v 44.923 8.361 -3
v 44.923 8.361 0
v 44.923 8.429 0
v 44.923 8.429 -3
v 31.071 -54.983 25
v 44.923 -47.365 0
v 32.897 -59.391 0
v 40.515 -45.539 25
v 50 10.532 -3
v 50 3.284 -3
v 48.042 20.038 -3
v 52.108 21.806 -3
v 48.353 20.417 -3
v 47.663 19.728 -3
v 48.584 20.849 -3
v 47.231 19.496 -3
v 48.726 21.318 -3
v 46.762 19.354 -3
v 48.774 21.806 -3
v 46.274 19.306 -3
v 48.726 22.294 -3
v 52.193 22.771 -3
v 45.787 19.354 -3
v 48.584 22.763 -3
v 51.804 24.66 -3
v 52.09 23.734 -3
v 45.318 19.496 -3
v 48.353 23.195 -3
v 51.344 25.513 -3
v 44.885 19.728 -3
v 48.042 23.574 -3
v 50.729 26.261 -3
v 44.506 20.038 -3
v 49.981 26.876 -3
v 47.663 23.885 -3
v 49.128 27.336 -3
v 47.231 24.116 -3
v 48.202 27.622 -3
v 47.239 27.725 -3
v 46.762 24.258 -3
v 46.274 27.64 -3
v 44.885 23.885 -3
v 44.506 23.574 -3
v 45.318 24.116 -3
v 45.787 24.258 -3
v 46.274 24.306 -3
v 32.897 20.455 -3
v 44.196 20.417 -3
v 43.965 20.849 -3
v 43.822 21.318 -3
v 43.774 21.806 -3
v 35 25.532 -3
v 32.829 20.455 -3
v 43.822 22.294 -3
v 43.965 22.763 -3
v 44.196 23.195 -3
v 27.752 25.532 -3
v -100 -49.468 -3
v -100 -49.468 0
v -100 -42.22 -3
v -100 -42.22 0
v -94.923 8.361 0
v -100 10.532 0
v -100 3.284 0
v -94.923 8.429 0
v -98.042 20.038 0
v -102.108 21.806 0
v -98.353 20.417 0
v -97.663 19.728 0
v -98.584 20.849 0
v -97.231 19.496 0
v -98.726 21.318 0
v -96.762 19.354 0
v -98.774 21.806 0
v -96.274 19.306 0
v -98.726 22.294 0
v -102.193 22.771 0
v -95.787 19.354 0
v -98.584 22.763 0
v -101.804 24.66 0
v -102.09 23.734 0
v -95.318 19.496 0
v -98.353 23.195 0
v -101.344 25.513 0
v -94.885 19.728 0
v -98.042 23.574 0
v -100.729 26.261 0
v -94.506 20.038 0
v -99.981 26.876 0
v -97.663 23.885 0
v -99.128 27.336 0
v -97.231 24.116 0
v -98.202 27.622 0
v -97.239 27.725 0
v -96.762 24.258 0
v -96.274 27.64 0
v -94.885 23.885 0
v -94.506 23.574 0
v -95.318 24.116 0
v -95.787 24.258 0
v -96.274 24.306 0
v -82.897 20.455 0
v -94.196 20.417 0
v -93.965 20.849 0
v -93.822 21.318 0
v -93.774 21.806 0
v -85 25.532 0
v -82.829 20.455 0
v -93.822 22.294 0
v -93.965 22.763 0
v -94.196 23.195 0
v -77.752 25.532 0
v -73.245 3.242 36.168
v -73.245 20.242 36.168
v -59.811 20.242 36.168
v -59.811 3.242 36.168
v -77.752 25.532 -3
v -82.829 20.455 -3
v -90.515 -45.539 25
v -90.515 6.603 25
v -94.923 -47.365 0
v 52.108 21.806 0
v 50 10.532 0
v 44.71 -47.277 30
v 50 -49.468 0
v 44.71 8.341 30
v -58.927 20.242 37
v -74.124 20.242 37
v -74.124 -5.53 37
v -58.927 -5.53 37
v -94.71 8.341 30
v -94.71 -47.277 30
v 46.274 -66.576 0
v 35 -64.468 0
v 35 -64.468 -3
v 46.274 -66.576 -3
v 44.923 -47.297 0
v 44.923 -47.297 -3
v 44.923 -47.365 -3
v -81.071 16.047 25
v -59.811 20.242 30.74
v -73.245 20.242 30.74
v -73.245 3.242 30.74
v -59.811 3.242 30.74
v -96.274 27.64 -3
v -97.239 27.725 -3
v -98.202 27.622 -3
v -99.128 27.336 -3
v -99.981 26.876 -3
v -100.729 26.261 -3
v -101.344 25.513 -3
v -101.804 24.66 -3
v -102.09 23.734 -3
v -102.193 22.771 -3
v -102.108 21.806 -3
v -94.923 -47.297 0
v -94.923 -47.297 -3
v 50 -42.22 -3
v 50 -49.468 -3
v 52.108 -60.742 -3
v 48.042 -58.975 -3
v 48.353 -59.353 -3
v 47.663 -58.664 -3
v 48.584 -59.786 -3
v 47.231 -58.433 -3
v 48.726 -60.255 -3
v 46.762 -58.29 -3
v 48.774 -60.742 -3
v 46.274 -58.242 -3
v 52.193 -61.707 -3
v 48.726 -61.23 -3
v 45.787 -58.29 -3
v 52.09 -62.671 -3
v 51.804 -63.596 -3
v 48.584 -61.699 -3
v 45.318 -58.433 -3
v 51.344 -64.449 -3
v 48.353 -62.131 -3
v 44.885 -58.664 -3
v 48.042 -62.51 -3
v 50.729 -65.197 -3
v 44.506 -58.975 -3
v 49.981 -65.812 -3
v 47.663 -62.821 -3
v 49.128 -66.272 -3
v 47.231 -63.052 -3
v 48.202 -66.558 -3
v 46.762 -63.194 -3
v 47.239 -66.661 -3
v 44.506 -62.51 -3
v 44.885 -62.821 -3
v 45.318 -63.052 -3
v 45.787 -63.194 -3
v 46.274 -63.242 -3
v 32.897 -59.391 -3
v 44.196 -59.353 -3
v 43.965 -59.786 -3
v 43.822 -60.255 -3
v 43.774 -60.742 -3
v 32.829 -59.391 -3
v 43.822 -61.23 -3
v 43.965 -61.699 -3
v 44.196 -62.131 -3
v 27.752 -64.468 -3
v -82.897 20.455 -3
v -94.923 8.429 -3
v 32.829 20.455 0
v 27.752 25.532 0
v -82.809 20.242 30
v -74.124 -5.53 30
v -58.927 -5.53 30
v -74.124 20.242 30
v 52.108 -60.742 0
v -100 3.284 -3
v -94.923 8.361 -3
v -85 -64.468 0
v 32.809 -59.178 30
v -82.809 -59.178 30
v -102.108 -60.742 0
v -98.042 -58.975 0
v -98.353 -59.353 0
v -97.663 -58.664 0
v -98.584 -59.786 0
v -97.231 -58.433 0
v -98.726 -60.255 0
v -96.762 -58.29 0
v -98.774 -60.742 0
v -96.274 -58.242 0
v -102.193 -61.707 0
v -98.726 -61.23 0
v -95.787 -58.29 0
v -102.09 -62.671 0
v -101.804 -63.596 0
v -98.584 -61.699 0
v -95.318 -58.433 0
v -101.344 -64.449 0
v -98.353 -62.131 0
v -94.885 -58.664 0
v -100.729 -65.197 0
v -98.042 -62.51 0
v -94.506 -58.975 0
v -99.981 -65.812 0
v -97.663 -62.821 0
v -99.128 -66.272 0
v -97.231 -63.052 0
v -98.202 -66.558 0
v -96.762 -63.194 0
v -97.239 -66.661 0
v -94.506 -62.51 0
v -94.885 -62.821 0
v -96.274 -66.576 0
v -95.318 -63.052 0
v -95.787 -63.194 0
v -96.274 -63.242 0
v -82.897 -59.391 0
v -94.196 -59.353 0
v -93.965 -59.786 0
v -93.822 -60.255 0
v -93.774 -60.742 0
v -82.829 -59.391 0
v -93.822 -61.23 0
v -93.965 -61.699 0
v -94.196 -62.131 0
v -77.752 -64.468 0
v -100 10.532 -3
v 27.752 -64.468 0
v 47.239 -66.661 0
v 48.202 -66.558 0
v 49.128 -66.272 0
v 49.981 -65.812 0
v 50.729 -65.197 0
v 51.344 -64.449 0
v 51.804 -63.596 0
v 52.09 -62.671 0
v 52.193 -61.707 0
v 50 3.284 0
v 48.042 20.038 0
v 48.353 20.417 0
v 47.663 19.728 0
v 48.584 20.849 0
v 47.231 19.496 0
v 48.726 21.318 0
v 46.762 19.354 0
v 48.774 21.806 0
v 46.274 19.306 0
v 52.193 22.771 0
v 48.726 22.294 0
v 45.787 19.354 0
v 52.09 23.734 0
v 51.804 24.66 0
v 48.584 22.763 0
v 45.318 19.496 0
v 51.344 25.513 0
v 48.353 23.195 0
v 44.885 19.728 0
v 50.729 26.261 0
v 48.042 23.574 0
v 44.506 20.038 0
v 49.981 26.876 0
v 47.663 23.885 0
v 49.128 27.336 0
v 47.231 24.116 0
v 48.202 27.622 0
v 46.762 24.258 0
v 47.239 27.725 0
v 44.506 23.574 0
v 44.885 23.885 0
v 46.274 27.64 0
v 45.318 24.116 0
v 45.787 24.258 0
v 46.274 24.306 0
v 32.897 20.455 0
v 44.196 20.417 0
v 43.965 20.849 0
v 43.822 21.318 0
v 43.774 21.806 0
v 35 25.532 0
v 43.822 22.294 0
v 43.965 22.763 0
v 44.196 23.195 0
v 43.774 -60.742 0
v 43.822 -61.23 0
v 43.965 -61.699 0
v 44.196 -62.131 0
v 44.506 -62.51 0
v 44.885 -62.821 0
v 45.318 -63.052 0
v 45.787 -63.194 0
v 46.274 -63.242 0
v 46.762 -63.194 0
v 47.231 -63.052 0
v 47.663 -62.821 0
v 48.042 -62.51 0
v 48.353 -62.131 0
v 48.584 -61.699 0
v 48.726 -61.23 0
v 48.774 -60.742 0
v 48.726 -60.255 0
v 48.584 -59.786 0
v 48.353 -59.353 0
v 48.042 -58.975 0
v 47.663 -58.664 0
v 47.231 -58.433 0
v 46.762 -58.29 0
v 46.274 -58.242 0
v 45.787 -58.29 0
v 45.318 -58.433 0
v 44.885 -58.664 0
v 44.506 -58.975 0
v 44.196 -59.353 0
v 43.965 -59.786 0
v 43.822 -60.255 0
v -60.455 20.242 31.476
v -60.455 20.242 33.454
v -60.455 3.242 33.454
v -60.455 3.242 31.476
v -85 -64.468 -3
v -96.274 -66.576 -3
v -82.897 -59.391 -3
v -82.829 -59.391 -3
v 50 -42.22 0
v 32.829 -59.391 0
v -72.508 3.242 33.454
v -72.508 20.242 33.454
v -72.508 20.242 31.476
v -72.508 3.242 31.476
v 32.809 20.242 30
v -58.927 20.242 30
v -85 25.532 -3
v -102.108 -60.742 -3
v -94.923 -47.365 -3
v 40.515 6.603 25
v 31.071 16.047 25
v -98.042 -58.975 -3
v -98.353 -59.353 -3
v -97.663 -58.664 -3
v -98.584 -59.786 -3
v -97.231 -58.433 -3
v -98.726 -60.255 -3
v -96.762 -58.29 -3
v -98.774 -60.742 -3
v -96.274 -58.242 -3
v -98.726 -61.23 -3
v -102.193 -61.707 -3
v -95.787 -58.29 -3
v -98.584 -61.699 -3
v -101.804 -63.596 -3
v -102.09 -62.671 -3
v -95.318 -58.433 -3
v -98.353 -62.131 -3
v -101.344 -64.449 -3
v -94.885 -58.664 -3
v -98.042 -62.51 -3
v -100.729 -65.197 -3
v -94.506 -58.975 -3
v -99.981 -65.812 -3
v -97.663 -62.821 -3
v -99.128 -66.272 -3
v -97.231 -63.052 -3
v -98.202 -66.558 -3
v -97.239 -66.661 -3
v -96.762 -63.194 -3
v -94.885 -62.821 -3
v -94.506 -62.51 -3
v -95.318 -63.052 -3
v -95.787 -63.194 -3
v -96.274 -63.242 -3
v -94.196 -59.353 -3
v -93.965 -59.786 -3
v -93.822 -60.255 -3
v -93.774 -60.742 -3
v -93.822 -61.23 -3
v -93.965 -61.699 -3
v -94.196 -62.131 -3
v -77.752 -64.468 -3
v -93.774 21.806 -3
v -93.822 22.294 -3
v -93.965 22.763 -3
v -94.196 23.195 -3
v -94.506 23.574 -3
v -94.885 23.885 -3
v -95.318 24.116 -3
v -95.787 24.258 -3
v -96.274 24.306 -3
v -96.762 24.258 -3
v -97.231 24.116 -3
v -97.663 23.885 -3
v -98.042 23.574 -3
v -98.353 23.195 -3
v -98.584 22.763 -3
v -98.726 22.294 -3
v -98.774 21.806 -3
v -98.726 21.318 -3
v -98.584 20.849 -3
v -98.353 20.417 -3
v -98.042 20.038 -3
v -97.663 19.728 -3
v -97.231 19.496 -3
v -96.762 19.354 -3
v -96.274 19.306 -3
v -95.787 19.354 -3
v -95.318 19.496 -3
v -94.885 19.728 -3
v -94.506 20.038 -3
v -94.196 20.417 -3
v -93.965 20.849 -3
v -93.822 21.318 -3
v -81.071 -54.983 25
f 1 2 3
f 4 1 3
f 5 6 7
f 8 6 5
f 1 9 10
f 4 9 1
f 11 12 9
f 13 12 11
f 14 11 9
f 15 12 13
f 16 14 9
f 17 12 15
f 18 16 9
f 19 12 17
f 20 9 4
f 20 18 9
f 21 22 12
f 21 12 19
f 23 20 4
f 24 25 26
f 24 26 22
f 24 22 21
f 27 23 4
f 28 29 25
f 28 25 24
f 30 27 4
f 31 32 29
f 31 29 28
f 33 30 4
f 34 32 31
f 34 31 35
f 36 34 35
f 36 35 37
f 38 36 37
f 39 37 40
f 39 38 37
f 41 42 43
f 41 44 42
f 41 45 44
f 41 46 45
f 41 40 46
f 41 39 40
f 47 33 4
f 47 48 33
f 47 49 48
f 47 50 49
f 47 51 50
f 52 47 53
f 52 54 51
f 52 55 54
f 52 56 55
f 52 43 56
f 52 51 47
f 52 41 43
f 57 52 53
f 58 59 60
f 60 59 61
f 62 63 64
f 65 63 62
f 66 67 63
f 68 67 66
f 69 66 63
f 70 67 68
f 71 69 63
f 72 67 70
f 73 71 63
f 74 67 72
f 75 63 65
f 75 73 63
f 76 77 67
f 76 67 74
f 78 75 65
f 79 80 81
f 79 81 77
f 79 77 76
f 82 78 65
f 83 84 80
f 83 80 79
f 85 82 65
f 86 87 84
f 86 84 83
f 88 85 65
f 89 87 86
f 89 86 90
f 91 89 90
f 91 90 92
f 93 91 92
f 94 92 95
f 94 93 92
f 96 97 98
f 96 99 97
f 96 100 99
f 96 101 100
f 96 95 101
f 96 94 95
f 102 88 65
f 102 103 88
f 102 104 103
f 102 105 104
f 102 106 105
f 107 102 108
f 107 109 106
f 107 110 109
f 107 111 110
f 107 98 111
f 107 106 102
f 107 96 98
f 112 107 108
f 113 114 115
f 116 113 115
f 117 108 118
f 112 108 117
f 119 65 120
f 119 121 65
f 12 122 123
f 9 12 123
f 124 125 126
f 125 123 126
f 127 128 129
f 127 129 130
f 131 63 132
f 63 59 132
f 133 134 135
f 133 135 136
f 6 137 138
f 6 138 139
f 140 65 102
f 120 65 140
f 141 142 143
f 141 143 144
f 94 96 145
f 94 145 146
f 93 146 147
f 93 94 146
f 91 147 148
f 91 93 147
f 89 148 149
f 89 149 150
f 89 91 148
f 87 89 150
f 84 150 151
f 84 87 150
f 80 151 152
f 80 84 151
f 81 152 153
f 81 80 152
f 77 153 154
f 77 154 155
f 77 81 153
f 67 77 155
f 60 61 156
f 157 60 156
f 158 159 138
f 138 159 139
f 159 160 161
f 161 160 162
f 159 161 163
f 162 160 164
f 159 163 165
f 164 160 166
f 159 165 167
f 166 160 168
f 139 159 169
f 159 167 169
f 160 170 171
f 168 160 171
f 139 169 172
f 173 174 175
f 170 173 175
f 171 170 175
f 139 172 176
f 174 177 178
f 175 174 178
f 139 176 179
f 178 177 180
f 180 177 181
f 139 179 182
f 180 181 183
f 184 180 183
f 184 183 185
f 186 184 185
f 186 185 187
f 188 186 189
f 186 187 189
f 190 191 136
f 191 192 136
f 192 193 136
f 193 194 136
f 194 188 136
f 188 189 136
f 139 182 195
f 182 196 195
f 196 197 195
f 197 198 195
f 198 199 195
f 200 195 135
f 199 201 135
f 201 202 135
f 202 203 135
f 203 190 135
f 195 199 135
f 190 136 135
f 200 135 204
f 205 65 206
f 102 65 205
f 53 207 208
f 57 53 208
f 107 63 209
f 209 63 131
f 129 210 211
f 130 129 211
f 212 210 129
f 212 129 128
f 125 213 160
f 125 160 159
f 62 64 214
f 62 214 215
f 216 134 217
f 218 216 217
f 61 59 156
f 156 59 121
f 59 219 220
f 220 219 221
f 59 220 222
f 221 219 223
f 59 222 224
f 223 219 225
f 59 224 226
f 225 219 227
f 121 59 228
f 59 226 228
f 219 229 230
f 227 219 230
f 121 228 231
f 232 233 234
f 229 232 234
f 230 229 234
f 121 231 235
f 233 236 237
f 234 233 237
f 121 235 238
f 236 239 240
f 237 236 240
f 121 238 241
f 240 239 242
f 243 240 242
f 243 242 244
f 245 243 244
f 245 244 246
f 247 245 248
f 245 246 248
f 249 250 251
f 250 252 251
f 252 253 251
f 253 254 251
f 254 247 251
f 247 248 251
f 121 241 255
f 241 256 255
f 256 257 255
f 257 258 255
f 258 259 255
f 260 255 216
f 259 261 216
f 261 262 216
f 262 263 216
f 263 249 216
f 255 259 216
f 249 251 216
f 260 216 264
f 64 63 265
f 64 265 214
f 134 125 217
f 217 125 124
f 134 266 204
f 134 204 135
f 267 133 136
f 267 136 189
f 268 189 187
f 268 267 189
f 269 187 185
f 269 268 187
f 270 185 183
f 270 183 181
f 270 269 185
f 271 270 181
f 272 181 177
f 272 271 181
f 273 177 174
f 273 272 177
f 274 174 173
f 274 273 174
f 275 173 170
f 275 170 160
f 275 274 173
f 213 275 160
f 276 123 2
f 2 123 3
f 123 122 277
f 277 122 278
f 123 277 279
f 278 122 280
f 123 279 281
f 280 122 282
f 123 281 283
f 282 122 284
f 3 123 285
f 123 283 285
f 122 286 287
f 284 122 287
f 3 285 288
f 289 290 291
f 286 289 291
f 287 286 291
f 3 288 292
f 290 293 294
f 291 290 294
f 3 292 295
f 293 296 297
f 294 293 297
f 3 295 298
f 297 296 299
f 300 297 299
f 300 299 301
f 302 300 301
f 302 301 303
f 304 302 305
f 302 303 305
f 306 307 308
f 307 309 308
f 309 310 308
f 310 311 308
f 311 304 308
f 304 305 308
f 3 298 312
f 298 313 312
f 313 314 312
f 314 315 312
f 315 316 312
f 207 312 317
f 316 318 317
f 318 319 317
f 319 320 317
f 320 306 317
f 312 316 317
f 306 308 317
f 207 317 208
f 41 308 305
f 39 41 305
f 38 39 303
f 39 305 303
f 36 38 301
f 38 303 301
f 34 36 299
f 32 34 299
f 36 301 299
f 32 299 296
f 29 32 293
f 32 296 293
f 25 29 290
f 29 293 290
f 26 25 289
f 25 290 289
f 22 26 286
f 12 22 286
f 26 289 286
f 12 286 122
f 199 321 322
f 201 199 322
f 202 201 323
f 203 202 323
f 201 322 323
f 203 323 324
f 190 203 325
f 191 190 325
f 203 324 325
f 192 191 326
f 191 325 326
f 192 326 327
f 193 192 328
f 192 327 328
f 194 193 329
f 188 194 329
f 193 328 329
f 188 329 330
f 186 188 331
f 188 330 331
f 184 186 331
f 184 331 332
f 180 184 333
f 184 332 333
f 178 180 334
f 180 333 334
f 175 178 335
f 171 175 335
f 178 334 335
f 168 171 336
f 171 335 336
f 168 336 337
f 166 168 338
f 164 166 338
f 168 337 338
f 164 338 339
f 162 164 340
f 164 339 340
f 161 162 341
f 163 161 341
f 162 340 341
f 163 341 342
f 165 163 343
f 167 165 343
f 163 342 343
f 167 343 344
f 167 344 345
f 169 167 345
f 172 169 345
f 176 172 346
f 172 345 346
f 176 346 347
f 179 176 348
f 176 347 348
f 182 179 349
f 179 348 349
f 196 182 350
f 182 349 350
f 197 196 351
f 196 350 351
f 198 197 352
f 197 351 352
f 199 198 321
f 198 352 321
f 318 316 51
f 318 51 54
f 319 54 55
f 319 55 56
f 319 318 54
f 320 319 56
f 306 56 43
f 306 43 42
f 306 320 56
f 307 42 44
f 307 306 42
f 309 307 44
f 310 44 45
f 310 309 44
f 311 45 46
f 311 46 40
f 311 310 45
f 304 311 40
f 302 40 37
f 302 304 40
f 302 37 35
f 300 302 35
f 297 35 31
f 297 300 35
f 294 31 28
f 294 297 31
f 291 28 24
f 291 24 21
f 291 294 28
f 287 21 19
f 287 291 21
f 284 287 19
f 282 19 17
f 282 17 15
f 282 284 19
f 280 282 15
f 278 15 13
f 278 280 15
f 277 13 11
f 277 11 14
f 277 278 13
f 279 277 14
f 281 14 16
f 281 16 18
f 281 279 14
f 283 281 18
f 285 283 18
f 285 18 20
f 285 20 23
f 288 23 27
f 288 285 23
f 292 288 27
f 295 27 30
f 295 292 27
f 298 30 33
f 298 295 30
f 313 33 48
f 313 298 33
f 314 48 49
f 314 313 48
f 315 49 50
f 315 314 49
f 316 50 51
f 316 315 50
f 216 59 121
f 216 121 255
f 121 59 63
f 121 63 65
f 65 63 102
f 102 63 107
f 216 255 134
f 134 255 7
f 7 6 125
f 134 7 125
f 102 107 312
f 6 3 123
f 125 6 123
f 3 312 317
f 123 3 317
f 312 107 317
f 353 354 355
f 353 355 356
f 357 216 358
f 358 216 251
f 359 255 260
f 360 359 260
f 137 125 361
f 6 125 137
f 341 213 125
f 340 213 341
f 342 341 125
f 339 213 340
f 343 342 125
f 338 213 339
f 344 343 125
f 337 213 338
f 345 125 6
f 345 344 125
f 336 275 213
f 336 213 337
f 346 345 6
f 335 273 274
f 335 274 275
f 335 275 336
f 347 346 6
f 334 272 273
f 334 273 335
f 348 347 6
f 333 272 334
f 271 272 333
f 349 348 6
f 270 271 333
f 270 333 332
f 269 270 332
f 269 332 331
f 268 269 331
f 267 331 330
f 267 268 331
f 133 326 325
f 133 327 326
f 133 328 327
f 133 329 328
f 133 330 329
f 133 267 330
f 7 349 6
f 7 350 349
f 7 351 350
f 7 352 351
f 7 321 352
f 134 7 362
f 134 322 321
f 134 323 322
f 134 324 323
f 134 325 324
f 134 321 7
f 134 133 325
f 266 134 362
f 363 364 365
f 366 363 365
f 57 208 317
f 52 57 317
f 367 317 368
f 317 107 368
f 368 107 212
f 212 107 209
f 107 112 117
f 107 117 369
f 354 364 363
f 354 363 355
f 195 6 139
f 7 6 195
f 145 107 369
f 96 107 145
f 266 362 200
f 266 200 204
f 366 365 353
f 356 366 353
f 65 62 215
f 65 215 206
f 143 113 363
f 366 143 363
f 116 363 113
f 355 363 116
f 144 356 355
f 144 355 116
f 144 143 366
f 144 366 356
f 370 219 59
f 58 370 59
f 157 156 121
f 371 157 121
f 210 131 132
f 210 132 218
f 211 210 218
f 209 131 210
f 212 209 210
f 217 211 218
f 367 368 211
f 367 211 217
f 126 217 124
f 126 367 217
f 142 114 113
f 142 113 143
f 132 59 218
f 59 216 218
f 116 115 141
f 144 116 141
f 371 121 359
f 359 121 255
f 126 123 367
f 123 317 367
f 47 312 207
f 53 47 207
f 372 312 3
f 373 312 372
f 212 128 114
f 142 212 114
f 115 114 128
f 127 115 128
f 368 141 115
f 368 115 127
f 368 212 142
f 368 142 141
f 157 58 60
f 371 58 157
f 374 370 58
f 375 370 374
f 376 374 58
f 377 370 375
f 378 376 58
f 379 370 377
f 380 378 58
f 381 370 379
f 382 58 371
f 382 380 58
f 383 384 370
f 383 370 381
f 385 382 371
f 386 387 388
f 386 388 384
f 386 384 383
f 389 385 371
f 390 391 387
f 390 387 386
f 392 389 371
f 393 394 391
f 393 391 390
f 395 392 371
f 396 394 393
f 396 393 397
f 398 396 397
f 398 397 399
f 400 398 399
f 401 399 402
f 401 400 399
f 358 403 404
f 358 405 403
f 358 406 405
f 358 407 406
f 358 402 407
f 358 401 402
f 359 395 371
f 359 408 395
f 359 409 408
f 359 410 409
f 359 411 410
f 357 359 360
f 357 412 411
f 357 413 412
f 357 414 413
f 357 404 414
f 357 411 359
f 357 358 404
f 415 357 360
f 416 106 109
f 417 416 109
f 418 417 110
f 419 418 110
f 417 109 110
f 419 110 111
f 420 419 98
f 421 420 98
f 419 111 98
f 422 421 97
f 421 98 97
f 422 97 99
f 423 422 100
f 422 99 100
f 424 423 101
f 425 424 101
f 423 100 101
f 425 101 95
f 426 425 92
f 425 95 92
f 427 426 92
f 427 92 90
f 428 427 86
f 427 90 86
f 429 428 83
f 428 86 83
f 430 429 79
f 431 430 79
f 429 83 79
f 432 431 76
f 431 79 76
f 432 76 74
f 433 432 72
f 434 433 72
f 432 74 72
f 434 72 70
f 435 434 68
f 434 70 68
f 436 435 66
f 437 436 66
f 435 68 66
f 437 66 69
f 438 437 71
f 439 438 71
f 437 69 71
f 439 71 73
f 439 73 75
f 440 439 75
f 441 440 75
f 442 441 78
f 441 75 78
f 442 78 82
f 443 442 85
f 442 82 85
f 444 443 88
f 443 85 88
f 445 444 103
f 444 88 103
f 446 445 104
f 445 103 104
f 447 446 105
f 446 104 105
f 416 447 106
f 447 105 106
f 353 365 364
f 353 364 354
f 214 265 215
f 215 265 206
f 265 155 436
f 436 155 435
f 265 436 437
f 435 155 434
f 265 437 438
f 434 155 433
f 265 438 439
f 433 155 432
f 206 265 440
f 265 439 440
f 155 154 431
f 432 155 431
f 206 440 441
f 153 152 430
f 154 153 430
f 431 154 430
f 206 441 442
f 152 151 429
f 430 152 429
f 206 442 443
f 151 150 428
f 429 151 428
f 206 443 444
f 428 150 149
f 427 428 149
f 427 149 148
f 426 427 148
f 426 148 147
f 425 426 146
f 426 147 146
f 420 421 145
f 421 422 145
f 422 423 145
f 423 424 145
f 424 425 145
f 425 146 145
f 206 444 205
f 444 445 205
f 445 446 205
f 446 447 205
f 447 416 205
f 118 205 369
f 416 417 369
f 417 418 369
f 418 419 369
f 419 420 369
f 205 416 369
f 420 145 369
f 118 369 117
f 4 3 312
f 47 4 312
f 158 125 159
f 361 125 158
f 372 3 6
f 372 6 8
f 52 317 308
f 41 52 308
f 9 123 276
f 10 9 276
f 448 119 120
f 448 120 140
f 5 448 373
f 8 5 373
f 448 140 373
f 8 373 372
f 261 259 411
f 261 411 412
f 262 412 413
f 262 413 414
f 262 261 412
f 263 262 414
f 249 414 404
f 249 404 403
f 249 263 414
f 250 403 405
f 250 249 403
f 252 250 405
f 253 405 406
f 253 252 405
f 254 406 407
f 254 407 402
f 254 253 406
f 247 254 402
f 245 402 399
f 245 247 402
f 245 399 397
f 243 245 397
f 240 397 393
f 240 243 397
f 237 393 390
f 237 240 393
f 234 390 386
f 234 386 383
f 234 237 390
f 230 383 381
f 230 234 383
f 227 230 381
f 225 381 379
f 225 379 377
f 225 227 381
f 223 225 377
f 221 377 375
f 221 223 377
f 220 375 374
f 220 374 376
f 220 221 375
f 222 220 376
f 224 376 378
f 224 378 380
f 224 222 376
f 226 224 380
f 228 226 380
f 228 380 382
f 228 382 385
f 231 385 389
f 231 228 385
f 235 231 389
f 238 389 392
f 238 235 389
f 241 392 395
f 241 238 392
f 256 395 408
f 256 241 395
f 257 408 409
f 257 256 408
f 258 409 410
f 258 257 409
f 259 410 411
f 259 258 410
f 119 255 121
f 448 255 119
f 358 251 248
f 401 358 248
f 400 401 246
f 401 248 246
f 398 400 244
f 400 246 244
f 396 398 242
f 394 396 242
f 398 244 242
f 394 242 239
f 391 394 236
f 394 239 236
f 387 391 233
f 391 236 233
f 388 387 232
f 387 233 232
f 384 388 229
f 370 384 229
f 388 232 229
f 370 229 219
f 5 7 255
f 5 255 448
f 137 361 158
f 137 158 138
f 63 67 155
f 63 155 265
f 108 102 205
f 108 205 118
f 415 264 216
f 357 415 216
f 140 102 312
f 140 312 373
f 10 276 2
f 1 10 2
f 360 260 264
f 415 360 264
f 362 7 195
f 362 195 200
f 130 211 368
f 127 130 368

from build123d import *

# Parameters (mm, degrees)
BOSS_EXTRUDE1_DEPTH     = 30
BOSS_EXTRUDE1_TAPER     = 10
SHELL1_T                = -5
SKETCH6_W               = 15.197518051
SKETCH6_H               = 25.772318446
BOSS_EXTRUDE4_DEPTH     = 7
SKETCH7_W               = 13.433844537
SKETCH7_H               = 5.428745395
SKETCH7_W_2             = 12.053655029
SKETCH7_H_2             = 1.978271627
CUT_EXTRUDE2_DEPTH      = 17
BOSS_EXTRUDE5_OUTLINE_R = 2.499999953
BOSS_EXTRUDE5_DEPTH     = 3


# Read off the part's stored shape, not the designer's step: Boss-Extrude5
with BuildPart() as part:
    # Sketch1 → Boss-Extrude1 (new body)
    with BuildSketch(Plane.XY):
        Polygon((-100, 10.531931481), (-100, -49.468068519), (-85, -64.468068519), (35, -64.468068519), (50, -49.468068519), (50, 10.531931481), (35, 25.531931481), (-85, 25.531931481), align=None)
    extrude(amount=BOSS_EXTRUDE1_DEPTH, taper=BOSS_EXTRUDE1_TAPER)

    # Shell1
    shell1_openings = [part.faces().sort_by_distance(p)[0] for p in [
        (-25, -19.468068519, 0),
    ]]
    offset(amount=SHELL1_T, openings=shell1_openings, kind=Kind.INTERSECTION)

    # Sketch6 → Boss-Extrude4 (add)
    with BuildSketch(Plane.XY.offset(30)):
        with Locations((-66.525501272, 7.355962837)):
            Rectangle(SKETCH6_W, SKETCH6_H)
    extrude(amount=BOSS_EXTRUDE4_DEPTH)

    # Sketch7 → Cut-Extrude2 (cut)
    with BuildSketch(Plane(origin=(0, 20.24212206, 0), x_dir=(1, 0, 0), z_dir=(0, 1, 0))):
        with Locations((-66.527599538, -33.454113167)):
            Rectangle(SKETCH7_W, SKETCH7_H)
        with Locations((-66.481593222, -32.464977353)):
            Rectangle(SKETCH7_W_2, SKETCH7_H_2, mode=Mode.SUBTRACT)
    extrude(amount=-CUT_EXTRUDE2_DEPTH, mode=Mode.SUBTRACT)


with BuildPart() as body_2:
    # Boss-Extrude5 outline → Boss-Extrude5 (new body)
    with BuildSketch(Plane(origin=(0, 0, 0), x_dir=(-1, 0, 0), z_dir=(0, 0, -1))):
        with BuildLine():
            ThreePointArc((-46.274245509, 27.639965524), (-50.728742794, 26.260674275), (-52.108034043, 21.80617699))
            Line((-52.108034043, 21.80617699), (-50, 10.531931481))
            Line((-50, 10.531931481), (-50, 3.284129796))
            Line((-50, 3.284129796), (-44.922866941, 8.361262855))
            Line((-44.922866941, 8.361262855), (-44.922866941, 8.42891411))
            Line((-44.922866941, 8.42891411), (-32.896982629, 20.454798422))
            Line((-32.896982629, 20.454798422), (-32.829331374, 20.454798422))
            Line((-32.829331374, 20.454798422), (-27.752198315, 25.531931481))
            Line((-27.752198315, 25.531931481), (-35, 25.531931481))
            Line((-35, 25.531931481), (-46.274245509, 27.639965524))
        make_face()
        with Locations((-46.274245509, 21.80617699)):
            Circle(BOSS_EXTRUDE5_OUTLINE_R, mode=Mode.SUBTRACT)
    extrude(amount=BOSS_EXTRUDE5_DEPTH)


with BuildPart() as body_3:
    # Mirror6: mirrored copy
    add(body_2.part.mirror(Plane(origin=(0, -19.468068519, 0), x_dir=(0, 0, 1), z_dir=(0, -1, 0))))


with BuildPart() as body_4:
    # Mirror7: mirrored copy
    add(body_3.part.mirror(Plane(origin=(-25, 0, 0), x_dir=(0, 0, 1), z_dir=(1, 0, 0))))


with BuildPart() as body_5:
    # Mirror7 2: mirrored copy
    add(body_2.part.mirror(Plane(origin=(-25, 0, 0), x_dir=(0, 0, 1), z_dir=(1, 0, 0))))


solid = Compound([part.part, body_2.part, body_3.part, body_4.part, body_5.part])
